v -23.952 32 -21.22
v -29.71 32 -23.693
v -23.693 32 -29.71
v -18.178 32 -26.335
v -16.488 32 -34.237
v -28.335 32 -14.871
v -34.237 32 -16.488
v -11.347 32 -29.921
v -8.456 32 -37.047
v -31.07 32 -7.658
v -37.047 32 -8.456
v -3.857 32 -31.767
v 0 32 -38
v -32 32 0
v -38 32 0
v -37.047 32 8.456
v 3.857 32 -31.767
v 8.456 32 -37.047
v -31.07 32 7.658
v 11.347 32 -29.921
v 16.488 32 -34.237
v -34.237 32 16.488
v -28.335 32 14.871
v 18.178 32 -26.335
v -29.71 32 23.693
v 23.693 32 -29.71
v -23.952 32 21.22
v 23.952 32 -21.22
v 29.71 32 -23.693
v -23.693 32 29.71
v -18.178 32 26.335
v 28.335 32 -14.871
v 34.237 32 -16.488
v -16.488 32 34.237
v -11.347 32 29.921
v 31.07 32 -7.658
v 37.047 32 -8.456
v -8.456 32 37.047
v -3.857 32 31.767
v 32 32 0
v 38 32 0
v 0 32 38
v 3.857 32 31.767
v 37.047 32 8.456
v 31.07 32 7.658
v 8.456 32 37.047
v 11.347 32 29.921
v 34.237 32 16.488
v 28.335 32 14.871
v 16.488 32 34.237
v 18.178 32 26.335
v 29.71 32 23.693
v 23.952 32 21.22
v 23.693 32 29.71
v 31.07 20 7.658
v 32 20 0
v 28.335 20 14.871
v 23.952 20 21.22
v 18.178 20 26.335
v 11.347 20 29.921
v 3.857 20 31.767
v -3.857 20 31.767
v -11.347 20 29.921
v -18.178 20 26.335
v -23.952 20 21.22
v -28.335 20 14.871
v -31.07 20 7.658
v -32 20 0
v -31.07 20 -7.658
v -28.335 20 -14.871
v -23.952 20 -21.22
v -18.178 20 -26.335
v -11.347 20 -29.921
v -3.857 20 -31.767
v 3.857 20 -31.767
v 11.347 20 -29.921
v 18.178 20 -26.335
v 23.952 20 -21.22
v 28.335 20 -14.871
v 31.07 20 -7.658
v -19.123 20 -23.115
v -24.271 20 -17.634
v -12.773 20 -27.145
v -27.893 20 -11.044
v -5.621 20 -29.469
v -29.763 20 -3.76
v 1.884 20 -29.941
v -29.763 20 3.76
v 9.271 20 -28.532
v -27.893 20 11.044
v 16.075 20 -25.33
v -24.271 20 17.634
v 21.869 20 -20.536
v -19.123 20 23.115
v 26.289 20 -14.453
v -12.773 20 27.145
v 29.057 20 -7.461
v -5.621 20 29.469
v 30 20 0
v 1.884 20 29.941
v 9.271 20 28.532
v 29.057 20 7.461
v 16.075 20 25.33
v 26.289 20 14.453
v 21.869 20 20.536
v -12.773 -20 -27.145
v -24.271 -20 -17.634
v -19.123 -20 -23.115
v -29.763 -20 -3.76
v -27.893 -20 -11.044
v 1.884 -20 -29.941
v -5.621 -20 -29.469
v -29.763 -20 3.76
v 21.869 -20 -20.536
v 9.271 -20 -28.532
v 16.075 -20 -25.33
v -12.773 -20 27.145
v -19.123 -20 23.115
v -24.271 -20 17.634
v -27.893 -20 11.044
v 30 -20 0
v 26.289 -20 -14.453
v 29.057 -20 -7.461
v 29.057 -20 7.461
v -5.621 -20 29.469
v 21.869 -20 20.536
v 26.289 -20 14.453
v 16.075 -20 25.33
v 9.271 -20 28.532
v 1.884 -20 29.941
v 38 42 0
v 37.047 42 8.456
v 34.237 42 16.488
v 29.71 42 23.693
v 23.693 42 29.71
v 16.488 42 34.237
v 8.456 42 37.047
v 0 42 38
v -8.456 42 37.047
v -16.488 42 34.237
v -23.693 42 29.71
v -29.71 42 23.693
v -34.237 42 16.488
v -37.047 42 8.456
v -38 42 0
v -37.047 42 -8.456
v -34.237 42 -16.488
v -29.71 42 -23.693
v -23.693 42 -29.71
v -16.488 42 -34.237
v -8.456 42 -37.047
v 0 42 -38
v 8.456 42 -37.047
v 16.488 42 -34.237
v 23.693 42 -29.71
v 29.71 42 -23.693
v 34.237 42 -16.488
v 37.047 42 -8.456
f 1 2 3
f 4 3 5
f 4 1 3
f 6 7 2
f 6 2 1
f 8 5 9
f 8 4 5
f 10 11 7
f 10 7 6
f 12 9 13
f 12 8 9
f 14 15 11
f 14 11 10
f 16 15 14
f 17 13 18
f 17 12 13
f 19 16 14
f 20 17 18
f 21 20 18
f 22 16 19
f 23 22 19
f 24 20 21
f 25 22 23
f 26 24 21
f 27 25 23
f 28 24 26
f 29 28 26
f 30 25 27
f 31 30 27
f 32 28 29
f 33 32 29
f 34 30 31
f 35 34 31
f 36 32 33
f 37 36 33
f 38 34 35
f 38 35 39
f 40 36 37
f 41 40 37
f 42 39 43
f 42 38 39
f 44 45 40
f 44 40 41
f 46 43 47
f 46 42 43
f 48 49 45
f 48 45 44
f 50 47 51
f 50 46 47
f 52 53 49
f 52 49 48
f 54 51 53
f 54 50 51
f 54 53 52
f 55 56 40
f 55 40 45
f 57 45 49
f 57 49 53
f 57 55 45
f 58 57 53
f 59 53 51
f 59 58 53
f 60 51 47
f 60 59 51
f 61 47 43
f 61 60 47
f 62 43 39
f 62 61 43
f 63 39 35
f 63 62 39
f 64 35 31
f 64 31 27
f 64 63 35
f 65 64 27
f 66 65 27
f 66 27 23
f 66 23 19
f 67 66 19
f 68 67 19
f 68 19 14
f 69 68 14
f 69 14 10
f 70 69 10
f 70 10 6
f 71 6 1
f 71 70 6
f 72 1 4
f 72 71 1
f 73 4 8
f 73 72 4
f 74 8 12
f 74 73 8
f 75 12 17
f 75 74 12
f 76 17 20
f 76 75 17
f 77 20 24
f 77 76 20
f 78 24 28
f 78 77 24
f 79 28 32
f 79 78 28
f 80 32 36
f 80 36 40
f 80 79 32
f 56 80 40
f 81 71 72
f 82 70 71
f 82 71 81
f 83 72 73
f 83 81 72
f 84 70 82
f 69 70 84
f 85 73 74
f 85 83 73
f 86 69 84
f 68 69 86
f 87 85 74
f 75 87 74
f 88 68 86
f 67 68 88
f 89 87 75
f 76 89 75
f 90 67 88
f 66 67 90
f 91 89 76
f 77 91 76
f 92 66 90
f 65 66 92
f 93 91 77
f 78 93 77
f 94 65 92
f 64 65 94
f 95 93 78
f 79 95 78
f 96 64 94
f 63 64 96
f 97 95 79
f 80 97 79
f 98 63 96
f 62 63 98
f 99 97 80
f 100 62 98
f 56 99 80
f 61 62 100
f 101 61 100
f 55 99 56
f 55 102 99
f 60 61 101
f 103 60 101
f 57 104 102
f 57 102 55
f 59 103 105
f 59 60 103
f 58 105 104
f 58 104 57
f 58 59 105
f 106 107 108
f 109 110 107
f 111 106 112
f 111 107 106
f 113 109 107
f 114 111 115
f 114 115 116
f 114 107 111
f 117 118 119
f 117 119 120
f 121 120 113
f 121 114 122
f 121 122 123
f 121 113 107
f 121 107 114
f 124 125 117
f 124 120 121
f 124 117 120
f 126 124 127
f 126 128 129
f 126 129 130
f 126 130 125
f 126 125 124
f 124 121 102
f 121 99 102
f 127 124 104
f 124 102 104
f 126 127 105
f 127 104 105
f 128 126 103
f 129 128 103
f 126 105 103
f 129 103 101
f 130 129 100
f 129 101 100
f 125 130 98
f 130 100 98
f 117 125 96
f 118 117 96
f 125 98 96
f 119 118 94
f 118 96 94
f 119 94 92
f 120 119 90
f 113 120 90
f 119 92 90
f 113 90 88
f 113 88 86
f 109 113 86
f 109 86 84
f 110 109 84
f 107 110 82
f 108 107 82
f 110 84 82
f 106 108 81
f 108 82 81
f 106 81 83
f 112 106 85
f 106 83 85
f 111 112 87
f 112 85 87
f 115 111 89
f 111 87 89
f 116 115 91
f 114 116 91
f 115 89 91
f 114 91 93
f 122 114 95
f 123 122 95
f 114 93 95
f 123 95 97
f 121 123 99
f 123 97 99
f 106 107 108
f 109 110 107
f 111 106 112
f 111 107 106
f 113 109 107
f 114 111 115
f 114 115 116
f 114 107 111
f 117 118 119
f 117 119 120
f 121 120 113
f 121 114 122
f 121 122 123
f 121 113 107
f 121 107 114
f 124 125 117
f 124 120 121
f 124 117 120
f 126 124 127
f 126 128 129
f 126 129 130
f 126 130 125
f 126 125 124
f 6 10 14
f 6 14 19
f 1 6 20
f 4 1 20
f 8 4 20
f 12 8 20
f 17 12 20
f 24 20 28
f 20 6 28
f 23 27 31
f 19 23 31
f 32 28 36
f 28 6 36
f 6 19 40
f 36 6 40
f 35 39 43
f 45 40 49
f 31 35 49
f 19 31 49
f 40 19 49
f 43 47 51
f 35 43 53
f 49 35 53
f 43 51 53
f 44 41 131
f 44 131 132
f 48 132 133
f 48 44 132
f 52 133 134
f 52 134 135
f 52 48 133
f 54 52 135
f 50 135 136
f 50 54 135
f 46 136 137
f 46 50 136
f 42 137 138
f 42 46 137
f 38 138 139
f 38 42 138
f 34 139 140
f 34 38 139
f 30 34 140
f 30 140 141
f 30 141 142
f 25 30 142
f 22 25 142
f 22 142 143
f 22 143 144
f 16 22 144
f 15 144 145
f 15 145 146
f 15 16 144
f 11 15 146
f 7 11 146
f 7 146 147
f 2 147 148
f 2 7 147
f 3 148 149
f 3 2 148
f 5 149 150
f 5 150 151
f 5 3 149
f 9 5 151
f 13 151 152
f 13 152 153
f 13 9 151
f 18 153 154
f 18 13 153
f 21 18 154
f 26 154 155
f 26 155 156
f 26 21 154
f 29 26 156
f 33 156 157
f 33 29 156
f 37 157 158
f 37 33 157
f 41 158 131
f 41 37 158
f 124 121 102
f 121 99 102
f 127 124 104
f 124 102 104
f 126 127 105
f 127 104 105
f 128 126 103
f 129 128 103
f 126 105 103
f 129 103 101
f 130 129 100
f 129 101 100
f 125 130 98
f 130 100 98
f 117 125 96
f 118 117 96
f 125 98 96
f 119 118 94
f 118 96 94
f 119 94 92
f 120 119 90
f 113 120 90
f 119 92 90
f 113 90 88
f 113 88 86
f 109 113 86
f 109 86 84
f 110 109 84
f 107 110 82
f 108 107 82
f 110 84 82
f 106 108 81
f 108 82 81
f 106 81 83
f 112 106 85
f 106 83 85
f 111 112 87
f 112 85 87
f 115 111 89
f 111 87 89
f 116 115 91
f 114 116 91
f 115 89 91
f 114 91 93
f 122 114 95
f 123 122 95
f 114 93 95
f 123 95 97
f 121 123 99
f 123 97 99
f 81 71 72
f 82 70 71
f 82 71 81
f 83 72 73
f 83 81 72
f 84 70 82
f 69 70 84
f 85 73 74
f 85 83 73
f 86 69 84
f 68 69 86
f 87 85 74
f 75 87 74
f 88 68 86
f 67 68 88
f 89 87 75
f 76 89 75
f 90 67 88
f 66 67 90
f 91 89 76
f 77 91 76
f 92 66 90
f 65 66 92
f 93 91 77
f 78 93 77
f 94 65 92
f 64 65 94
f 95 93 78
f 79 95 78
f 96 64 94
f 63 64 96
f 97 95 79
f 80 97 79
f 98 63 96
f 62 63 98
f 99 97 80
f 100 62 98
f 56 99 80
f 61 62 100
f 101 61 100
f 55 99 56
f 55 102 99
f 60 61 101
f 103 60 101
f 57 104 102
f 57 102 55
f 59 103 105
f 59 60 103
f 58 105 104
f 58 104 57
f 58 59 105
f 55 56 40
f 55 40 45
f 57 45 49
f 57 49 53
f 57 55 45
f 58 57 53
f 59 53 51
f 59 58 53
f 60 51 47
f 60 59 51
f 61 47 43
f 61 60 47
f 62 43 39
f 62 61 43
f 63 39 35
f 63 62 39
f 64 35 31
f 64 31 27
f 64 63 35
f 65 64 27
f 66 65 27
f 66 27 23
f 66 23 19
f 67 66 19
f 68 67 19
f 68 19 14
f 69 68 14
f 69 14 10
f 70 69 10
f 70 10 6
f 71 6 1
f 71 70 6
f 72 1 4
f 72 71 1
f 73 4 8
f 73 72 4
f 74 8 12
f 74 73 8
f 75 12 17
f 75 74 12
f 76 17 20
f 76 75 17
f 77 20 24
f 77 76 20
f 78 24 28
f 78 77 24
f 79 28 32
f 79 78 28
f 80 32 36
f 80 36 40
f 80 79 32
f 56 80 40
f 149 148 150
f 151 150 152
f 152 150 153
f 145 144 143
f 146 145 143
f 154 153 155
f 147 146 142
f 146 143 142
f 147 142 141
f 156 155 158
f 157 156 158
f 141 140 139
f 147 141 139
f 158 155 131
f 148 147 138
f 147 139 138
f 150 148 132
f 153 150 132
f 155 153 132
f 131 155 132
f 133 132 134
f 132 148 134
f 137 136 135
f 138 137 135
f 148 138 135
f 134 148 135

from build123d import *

# Parameters (mm, degrees)
SKETCH_R     = 30
PAD_DEPTH    = 20
SKETCH001_R  = 32
PAD001_DEPTH = 12
SKETCH002_R  = 38
PAD002_DEPTH = 10


with BuildPart() as pad001:
    # Sketch → Pad (new body, symmetric)
    with BuildSketch(Plane.XZ):
        Circle(SKETCH_R)
    extrude(amount=PAD_DEPTH, both=True)

    # Sketch001 → Pad001 (new body)
    with BuildSketch(Plane.XZ.offset(20)):
        Circle(SKETCH001_R)
    extrude(amount=PAD001_DEPTH)


with BuildPart() as part_mirroring:
    # Part__Mirroring: instance of Pad001
    add(pad001.part.mirror(Plane(origin=(0, 0, 0), x_dir=(1, 0, 0), z_dir=(0, 1, 0))))


with BuildPart() as pad002:
    # Pad002 base: copy of Pad001
    add(pad001.part)

    # Sketch002 → Pad002 (new body)
    with BuildSketch(Plane.XZ.offset(32)):
        Circle(SKETCH002_R)
    extrude(amount=PAD002_DEPTH)


with BuildPart() as part_mirroring001:
    # Part__Mirroring001: instance of Pad002
    add(pad002.part.mirror(Plane(origin=(0, 0, 0), x_dir=(1, 0, 0), z_dir=(0, 1, 0))))


solid = Compound([part_mirroring.part, part_mirroring001.part])
